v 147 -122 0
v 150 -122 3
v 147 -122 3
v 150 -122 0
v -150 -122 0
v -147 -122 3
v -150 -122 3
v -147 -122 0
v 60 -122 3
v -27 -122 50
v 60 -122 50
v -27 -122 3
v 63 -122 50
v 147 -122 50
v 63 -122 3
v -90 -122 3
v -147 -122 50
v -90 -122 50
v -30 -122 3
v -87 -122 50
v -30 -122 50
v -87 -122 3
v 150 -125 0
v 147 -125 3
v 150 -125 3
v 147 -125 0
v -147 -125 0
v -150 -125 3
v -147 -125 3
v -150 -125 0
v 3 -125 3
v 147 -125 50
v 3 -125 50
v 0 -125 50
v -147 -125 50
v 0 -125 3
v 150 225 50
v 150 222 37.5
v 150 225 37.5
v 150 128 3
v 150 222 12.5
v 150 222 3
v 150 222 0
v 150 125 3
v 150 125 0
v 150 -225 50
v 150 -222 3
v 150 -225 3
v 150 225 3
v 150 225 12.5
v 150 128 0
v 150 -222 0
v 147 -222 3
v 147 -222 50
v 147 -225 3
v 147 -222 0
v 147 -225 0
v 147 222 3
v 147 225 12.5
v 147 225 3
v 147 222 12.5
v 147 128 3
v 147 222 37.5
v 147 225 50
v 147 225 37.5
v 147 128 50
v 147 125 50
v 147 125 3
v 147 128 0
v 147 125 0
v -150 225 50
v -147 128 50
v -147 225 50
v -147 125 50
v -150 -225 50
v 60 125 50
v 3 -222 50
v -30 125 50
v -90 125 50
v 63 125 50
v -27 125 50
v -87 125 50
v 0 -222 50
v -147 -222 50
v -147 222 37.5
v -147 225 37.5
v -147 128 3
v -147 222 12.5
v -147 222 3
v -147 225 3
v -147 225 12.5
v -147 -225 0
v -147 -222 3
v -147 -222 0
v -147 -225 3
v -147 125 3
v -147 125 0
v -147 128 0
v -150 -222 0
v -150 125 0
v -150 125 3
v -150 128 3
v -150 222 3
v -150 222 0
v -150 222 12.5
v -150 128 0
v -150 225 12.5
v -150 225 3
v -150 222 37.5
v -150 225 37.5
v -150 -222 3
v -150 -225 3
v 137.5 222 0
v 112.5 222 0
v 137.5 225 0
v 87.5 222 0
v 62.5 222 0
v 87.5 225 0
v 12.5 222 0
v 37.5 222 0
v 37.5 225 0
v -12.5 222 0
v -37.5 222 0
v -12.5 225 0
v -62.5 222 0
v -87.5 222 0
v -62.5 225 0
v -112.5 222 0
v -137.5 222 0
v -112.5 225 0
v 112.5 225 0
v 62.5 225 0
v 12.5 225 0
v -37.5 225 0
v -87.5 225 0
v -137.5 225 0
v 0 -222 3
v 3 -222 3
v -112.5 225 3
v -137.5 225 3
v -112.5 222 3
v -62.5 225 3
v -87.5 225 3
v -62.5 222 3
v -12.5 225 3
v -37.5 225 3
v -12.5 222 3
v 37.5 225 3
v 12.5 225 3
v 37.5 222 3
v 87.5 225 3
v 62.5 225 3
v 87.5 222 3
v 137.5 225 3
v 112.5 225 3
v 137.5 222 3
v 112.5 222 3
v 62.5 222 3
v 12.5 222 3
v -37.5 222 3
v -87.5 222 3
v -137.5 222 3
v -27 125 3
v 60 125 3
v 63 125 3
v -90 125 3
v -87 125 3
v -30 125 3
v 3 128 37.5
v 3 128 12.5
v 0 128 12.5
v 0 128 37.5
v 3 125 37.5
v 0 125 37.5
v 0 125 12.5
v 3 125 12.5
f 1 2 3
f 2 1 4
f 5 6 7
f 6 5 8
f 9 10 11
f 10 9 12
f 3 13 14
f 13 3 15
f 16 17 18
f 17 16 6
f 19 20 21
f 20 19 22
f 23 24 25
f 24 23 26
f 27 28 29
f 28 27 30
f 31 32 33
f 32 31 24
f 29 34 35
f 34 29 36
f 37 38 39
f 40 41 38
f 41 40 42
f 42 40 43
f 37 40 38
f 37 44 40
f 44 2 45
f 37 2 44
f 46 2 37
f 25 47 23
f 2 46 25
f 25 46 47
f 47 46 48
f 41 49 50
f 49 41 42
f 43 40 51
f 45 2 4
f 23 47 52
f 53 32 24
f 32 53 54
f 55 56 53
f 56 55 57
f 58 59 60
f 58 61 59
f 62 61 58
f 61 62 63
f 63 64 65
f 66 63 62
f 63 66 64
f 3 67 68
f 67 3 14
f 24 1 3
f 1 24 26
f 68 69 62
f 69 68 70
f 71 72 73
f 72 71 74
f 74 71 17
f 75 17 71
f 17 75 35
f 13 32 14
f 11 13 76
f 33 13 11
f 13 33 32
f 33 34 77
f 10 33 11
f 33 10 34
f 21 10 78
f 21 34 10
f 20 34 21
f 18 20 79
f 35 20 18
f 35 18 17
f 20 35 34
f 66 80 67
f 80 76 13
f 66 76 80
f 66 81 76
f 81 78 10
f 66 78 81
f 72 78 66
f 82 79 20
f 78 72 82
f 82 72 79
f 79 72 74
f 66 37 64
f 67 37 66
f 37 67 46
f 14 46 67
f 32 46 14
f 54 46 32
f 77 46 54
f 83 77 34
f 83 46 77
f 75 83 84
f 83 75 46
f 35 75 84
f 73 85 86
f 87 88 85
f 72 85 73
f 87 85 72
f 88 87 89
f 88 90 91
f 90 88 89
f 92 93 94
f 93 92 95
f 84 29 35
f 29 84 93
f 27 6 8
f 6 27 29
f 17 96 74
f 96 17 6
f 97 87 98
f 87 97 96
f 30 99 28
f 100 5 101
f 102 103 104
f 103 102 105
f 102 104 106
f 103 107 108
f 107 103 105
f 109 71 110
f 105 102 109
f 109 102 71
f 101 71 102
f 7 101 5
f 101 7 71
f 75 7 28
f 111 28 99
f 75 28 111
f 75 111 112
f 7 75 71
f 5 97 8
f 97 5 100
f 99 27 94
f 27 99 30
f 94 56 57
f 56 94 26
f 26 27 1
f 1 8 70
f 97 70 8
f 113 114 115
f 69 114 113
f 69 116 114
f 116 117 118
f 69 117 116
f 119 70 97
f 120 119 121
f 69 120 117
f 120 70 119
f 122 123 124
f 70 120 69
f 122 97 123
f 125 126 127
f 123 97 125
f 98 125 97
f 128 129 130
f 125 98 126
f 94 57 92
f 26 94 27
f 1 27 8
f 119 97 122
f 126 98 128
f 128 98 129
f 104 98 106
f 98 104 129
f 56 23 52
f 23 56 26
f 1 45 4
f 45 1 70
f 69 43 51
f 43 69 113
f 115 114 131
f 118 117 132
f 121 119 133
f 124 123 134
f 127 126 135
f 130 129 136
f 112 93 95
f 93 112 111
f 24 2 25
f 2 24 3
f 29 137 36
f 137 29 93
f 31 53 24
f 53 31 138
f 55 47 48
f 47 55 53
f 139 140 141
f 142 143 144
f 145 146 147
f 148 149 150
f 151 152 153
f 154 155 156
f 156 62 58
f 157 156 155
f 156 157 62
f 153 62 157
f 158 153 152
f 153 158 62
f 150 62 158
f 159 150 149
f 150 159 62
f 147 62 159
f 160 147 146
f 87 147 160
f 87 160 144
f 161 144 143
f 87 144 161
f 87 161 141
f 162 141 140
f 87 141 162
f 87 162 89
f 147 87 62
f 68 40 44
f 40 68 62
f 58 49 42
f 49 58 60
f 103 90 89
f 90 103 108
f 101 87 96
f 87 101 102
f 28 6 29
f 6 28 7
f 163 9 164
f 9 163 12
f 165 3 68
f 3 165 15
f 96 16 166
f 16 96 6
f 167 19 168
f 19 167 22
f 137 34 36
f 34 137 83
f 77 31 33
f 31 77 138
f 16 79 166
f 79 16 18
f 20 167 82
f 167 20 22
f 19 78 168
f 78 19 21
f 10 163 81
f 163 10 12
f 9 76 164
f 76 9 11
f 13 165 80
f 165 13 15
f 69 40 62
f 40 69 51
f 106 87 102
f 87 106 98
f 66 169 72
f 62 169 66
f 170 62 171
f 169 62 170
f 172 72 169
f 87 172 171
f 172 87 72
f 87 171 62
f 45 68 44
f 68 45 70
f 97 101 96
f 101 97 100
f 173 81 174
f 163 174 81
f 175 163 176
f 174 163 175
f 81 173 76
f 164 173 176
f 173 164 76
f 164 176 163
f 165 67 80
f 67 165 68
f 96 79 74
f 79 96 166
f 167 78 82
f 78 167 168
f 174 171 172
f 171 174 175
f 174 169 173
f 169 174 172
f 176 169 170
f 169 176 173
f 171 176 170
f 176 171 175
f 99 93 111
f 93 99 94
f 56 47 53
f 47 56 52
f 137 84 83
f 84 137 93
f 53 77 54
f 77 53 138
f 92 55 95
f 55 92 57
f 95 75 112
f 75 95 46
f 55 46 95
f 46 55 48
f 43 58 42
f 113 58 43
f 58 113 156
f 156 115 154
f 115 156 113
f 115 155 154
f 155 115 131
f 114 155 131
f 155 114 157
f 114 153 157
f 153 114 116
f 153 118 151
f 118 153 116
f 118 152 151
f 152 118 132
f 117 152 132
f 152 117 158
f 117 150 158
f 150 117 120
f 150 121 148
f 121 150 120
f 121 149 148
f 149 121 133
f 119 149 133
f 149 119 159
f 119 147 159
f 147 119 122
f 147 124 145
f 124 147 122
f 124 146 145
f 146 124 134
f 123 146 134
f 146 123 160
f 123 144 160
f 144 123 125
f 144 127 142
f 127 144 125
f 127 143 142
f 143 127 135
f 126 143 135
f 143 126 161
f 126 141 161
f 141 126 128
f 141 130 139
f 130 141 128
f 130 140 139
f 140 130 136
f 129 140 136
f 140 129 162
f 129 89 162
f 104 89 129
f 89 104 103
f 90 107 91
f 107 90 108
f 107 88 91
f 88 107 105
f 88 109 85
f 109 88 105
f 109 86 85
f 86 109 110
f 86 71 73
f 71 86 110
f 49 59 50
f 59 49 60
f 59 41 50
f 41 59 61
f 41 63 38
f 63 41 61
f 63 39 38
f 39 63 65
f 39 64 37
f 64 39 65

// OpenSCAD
include <config.scad>
//$fs=$fs/2;
//$fa=$fa/2;

tiroir_l = 300;
tiroir_lg = 450;
tiroir_h = 50;
tiroir_h2 = 50;

$fn=100;

e = 3; //2.74
cran = 25;

tiroir_division_lg = [100, 350];

tiroir_division_l1 = [150];
tiroir_division_l1_lg = 100+e;

tiroir_division_l2 = [60, 120, 210];
tiroir_division_l2_lg = 250+e;


plateau_l = tiroir_l-110;
plateau_lg = tiroir_lg/2-3*e;
plateau_h = 40;

module fond(l, lg){
    difference(){
        square([l, lg]);
        
        translate([0, -1])cran_x(l, e + 1, cran, true);
        translate([0, lg - e])cran_x(l, e + 1, cran, true);
        
        translate([-1, 0])cran_y(lg, e , cran, true);
        translate([l-e, 0 ])cran_y(lg, e + 1, cran, true);
    }
}

module longueur(l, h){
    difference(){
        square([l, h]);
        
        cran_x(l, e, cran, false);
        translate([-1, 0])cran_y(h, e + 1, cran, false);
        translate([l-e, 0])cran_y(h, e + 1, cran, false);
    }
}

module largeur(lg, h){
    difference(){
        square([lg, h]);
        
        cran_x(lg, e, cran, false);      
        translate([-1, 0])cran_y(h, e + 1, cran, true);
        translate([lg-e, 0])cran_y(h, e + 1, cran, true);

    }
}

module plateau(l,lg,h, expand, de){
    if(expand){
        linear_extrude(de) fond(l,lg);
        
        translate([0,0,0]) rotate([90, 0, 90]) linear_extrude(de) largeur(lg,h);
        translate([l-e,0,0]) rotate([90, 0, 90]) linear_extrude(de) largeur(lg,h);
        translate([0,e,0]) rotate([90, 0, 0]) linear_extrude(de) longueur(l,h);
        translate([0,lg,0]) rotate([90, 0, 0]) linear_extrude(de) longueur(l,h);
    } else {
        translate([0, 0]) fond(l,lg);
        translate([0, lg + de + 0*(h+de)]) longueur(l,h);
        translate([0, lg + de + 1*(h+de)]) longueur(l,h);
        translate([0, lg + de + 2*(h+de)]) largeur(lg,h);
        translate([0, lg + de + 3*(h+de)]) largeur(lg,h);
    }
}


module fond_tiroir(){
    difference(){
        fond(tiroir_l, tiroir_lg);
        
        //separation
        for(i = tiroir_division_lg){
            translate([0, i])cran_x(tiroir_l, e, cran, true);
        }
        
        for(i = tiroir_division_l1){
            translate([i, 0])cran_y(tiroir_division_l1_lg, e, cran, true);
        }
        for(i = tiroir_division_l2){
            translate([i, 100])cran_y(tiroir_division_l2_lg, e, cran, true);
        }
    }
}

module tiroir_lg(){
    difference(){
        largeur(tiroir_lg, tiroir_h);
        
        for(i = tiroir_division_lg){
            translate([i, 0])cran_y(tiroir_h, e, cran, true);
        } 
     }
}


module tiroir_l_left(){
    difference(){
        longueur(tiroir_l, tiroir_h);
        
        for(i = tiroir_division_l1){
            translate([i, 0])cran_y(tiroir_h2, e, cran, true);
        }
    }
}

module tiroir_l_right(){
    difference(){
        longueur(tiroir_l, tiroir_h);
        
        
    }
}


module tiroir_division_lg_(){
    difference(){
        square([tiroir_l, tiroir_h]);
        
        translate([0, -1])cran_x(tiroir_l, e + 1, cran, false);
        translate([-1, 0])cran_y(tiroir_h, e + 1, cran, false);
        translate([tiroir_l-e, 0])cran_y(tiroir_h, e + 1, cran, false);
        
        for(i = tiroir_division_l1){
            translate([i, 0])cran_y(tiroir_h2, e, cran, true);
        }
        for(i = tiroir_division_l2){
            translate([i, 0])cran_y(tiroir_h, e, cran, true);
        }
    }
}

module tiroir_division_l1(){
    difference(){
        square([tiroir_division_l1_lg, tiroir_h2]);
        
         translate([0, -1])cran_x(tiroir_division_l1_lg, e + 1, cran, false);
        translate([-1, 0])cran_y(tiroir_h2, e + 1, cran, false);
        translate([tiroir_division_l1_lg-e, 0])cran_y(tiroir_h2, e + 1, cran, false);
    }
}

module tiroir_division_l2(){
    difference(){
        square([tiroir_division_l2_lg, tiroir_h]);
        
        translate([0, -1])cran_x(tiroir_division_l2_lg, e + 1, cran, false);
        translate([-1, 0])cran_y(tiroir_h, e + 1, cran, false);
        translate([tiroir_division_l2_lg-e, 0])cran_y(tiroir_h, e + 1, cran, false);
    }
}

module plateau_fond(){
    difference(){
        square([plateau_l, plateau_lg]);
        
        translate([0, -1])cran_x(plateau_l, e + 1, cran, true);
        translate([0, plateau_lg - e])cran_x(plateau_l, e + 1, cran, true);
        
        translate([-1, 0])cran_y(plateau_lg, e , cran, true);
        translate([plateau_l-e, 0 ])cran_y(plateau_lg, e + 1, cran, true);
    }
}

module plateau_lg(){
    difference(){
        square([plateau_lg, plateau_h]);
        
        cran_x(plateau_lg, e, cran, false);
        translate([-1, 0])cran_y(plateau_h, e + 1, cran, true);
        translate([plateau_lg-e, 0])cran_y(plateau_h, e + 1, cran, true);
    }
}

module plateau_l(){
    difference(){
        square([plateau_l, plateau_h]);
        
        cran_x(plateau_l, e, cran, false);
        translate([-1, 0])cran_y(plateau_h, e + 1, cran, false);
        translate([plateau_l-e, 0])cran_y(plateau_h, e + 1, cran, false);
    }
}

if(true){
    e2 = e;
    translate([-tiroir_l/2, -tiroir_lg/2])union(){
        linear_extrude(e2) fond_tiroir();
        translate([0,0,0]) rotate([90, 0, 90]) linear_extrude(e2) tiroir_lg();
        translate([tiroir_l-e,0,0]) rotate([90, 0, 90]) linear_extrude(e2) tiroir_lg();
        translate([0,e,0]) rotate([90, 0, 0]) linear_extrude(e2)tiroir_l_left();
        translate([0,tiroir_lg,0]) rotate([90, 0, 0]) linear_extrude(e2)tiroir_l_right();
        
        for(i = tiroir_division_lg){
            translate([0, i+e])rotate([90, 0, 0]) linear_extrude(e2) tiroir_division_lg_();
        }
        for(i = tiroir_division_l1){
            translate([i,0]) rotate([90, 0, 90]) linear_extrude(e2)tiroir_division_l1();
        }
        for(i = tiroir_division_l2){
            translate([i, 100]) rotate([90, 0, 90]) linear_extrude(e2)tiroir_division_l2();
        }
        
        
    }
    
    translate([-tiroir_l/2 +1.5*e, -tiroir_lg/2 +1.5*e,tiroir_h2]) union(){ 
        //plateau(plateau_l, plateau_lg, plateau_h, true, e2);
        
        
        
    }
       
} else {
    de=1;
    %square([456, 609]);
    
    fond_tiroir();
    translate([0,tiroir_lg + de,0]) tiroir_lg();
    translate([0,tiroir_lg + 2*de + tiroir_h,0]) tiroir_lg();
    translate([-456, 0]) tiroir_l_left();
    translate([-456, (tiroir_h+de)]) tiroir_l_right();
    translate([-456, 2*(tiroir_h+de)])tiroir_division_lg_();
    translate([-456, 3*(tiroir_h+de)])tiroir_division_l2();
    translate([-456, 4*(tiroir_h+de)])tiroir_division_l1();
    translate([-456, 5*(tiroir_h+de)])tiroir_division_l1();
    translate([456, 0]) plateau(plateau_l, plateau_lg, plateau_h, false, de);
}
